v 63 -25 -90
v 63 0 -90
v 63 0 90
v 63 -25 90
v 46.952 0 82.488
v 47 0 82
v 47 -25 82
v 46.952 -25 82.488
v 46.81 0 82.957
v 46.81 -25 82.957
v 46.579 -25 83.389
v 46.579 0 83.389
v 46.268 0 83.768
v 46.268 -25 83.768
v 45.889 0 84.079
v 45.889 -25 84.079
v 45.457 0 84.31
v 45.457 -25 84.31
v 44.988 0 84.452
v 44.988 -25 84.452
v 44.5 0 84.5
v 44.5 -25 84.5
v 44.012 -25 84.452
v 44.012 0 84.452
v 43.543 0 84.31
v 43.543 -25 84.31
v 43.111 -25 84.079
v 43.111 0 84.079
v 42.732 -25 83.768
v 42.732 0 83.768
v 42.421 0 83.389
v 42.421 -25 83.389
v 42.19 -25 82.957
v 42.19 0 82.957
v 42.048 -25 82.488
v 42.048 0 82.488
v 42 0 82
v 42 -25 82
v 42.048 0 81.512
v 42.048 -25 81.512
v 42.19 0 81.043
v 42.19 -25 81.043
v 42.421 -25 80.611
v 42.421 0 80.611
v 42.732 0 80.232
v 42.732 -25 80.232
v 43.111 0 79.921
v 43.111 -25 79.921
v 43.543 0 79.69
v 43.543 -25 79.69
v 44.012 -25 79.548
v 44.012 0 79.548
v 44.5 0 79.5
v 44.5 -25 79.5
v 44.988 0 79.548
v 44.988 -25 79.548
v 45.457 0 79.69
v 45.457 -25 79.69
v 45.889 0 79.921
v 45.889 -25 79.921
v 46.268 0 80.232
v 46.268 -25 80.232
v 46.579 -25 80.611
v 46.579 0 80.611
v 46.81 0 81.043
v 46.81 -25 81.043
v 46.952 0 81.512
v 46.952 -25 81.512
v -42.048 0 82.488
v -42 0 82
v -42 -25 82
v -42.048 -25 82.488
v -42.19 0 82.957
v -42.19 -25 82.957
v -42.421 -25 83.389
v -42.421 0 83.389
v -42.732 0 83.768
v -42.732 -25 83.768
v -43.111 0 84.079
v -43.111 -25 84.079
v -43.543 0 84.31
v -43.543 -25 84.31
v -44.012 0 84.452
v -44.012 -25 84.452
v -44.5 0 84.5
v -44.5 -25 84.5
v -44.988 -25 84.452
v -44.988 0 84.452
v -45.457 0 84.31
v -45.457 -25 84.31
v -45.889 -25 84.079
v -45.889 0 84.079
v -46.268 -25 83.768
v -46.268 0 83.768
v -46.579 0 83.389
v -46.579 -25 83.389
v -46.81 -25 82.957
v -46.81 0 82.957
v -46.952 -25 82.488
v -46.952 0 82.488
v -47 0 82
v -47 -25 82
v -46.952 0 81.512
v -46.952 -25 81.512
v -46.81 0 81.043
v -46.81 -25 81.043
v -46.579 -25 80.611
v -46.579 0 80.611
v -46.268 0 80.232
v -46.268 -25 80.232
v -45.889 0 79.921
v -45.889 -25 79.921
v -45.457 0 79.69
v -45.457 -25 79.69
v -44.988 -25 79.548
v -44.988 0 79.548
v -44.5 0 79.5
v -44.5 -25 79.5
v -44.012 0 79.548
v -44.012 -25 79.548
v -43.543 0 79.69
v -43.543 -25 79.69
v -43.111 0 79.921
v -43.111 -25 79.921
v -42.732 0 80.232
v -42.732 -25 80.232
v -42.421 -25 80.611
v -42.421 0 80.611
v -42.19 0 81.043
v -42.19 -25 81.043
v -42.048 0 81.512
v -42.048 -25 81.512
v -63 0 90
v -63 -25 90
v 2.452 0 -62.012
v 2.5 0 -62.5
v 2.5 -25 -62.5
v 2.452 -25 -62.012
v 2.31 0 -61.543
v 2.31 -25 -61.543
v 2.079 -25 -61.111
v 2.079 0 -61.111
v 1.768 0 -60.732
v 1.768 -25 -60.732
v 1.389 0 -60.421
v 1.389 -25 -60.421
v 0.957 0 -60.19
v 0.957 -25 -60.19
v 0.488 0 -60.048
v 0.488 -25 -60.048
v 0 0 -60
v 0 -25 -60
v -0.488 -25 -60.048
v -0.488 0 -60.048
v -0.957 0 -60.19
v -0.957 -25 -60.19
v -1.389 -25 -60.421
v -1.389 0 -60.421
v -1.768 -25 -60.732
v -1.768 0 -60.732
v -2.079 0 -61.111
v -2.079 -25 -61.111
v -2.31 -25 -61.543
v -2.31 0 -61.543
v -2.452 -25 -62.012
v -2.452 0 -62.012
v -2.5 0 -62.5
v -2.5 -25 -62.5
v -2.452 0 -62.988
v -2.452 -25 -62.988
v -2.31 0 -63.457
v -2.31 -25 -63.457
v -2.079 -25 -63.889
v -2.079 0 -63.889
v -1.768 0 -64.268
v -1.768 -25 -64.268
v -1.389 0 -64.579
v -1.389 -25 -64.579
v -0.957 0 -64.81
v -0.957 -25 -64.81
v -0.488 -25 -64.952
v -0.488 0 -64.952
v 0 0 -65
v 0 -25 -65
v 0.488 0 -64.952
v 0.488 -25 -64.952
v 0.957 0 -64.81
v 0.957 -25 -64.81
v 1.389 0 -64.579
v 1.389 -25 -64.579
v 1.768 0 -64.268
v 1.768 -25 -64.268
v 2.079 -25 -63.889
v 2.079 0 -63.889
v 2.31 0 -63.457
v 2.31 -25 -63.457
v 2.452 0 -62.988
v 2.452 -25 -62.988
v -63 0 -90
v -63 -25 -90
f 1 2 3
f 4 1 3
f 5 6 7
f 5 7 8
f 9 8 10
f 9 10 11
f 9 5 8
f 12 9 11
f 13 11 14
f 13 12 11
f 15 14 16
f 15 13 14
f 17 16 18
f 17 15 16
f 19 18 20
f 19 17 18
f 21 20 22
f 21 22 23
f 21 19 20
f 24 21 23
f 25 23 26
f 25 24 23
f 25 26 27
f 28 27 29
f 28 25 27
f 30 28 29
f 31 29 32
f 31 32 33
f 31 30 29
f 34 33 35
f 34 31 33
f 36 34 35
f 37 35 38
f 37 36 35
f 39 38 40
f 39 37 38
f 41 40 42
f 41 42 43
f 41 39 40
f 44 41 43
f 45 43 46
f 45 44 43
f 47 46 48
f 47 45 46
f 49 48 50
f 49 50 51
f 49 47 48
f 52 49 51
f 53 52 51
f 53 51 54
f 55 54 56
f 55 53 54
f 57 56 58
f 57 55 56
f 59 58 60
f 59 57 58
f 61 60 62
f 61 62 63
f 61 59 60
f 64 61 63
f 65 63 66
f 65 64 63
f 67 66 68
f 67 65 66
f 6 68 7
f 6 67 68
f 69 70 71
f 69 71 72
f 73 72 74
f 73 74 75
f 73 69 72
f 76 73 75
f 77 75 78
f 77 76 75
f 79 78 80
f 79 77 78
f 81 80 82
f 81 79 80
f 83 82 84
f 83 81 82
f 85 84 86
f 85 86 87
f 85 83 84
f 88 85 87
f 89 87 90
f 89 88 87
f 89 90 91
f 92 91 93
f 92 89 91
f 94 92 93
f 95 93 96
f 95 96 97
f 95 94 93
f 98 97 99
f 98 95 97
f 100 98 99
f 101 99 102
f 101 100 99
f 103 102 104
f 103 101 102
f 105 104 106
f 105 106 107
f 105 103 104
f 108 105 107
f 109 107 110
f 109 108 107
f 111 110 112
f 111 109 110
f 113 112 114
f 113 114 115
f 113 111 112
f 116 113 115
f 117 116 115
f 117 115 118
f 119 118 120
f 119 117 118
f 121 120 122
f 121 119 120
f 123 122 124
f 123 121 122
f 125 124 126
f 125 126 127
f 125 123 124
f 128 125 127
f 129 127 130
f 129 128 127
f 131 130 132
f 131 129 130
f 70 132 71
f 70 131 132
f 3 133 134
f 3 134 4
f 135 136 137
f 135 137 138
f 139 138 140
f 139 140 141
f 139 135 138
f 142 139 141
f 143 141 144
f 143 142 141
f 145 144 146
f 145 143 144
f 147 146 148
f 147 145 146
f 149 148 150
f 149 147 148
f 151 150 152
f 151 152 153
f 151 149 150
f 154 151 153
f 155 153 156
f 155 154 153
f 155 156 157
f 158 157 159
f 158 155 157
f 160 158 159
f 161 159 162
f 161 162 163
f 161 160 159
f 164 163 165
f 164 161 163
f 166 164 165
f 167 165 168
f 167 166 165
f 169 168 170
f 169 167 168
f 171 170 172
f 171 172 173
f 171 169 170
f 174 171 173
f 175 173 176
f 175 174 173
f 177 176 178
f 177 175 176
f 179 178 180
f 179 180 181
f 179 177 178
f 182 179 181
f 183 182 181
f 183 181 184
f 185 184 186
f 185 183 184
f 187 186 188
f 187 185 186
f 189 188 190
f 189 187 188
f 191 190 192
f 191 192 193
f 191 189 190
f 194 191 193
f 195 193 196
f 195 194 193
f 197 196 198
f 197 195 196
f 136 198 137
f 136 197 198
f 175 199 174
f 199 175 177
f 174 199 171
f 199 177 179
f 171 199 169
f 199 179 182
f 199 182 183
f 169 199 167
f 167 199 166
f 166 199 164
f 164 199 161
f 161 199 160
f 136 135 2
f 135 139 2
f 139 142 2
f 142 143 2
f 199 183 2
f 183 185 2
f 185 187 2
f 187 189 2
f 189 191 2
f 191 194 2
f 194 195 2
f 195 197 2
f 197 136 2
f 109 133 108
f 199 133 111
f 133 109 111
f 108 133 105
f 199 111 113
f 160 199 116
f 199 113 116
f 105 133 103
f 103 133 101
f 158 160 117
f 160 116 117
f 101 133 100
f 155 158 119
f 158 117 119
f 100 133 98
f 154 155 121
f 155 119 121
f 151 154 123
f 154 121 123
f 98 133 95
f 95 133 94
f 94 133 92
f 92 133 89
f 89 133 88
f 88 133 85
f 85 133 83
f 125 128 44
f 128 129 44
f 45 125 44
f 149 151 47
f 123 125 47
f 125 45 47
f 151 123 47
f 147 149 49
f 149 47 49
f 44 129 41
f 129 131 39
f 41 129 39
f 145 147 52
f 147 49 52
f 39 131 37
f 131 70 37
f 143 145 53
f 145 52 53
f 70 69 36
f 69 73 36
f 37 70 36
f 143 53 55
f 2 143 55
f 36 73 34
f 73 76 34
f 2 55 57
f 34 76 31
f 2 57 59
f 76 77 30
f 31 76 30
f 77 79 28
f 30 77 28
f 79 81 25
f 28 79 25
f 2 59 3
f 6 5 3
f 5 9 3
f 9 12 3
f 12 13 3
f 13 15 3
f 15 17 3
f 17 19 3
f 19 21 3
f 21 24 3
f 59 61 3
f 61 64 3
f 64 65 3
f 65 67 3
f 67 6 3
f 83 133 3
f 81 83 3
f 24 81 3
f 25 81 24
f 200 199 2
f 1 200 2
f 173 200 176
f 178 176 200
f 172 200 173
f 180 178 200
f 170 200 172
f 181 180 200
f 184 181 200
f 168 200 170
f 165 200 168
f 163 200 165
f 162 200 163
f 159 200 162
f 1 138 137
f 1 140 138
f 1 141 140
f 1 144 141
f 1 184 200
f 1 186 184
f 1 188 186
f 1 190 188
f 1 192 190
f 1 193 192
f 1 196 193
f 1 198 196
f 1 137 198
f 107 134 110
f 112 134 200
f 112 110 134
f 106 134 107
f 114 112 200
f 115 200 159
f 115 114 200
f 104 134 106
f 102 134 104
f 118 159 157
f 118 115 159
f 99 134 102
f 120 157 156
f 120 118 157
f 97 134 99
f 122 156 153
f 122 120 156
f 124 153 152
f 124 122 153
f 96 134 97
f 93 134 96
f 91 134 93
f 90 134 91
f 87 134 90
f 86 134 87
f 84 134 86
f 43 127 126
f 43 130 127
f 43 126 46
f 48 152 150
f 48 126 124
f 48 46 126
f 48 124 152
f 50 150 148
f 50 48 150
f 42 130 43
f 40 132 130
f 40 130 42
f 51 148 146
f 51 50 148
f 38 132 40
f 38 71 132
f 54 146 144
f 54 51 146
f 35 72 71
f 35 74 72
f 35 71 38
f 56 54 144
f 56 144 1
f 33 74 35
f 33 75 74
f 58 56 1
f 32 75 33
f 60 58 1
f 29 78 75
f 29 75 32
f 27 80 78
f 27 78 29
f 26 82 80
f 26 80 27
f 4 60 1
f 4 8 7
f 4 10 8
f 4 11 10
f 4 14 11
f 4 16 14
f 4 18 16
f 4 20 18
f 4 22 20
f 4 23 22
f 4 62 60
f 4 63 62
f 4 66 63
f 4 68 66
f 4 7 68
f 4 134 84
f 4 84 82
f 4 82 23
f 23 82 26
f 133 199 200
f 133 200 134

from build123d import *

# Parameters (mm, degrees)
F0_W     = 126
F0_H     = 180
F0_R     = 2.5
F1_DEPTH = 25


with BuildPart() as f1:
    # F0 (on Front) → F1 (new body)
    with BuildSketch(Plane.XZ):
        Rectangle(F0_W, F0_H)
        with Locations((0, -62.5)):
            Circle(F0_R, mode=Mode.SUBTRACT)
        with Locations((-44.5, 82)):
            Circle(F0_R, mode=Mode.SUBTRACT)
        with Locations((44.5, 82)):
            Circle(F0_R, mode=Mode.SUBTRACT)
    extrude(amount=F1_DEPTH)


solid = f1.part
